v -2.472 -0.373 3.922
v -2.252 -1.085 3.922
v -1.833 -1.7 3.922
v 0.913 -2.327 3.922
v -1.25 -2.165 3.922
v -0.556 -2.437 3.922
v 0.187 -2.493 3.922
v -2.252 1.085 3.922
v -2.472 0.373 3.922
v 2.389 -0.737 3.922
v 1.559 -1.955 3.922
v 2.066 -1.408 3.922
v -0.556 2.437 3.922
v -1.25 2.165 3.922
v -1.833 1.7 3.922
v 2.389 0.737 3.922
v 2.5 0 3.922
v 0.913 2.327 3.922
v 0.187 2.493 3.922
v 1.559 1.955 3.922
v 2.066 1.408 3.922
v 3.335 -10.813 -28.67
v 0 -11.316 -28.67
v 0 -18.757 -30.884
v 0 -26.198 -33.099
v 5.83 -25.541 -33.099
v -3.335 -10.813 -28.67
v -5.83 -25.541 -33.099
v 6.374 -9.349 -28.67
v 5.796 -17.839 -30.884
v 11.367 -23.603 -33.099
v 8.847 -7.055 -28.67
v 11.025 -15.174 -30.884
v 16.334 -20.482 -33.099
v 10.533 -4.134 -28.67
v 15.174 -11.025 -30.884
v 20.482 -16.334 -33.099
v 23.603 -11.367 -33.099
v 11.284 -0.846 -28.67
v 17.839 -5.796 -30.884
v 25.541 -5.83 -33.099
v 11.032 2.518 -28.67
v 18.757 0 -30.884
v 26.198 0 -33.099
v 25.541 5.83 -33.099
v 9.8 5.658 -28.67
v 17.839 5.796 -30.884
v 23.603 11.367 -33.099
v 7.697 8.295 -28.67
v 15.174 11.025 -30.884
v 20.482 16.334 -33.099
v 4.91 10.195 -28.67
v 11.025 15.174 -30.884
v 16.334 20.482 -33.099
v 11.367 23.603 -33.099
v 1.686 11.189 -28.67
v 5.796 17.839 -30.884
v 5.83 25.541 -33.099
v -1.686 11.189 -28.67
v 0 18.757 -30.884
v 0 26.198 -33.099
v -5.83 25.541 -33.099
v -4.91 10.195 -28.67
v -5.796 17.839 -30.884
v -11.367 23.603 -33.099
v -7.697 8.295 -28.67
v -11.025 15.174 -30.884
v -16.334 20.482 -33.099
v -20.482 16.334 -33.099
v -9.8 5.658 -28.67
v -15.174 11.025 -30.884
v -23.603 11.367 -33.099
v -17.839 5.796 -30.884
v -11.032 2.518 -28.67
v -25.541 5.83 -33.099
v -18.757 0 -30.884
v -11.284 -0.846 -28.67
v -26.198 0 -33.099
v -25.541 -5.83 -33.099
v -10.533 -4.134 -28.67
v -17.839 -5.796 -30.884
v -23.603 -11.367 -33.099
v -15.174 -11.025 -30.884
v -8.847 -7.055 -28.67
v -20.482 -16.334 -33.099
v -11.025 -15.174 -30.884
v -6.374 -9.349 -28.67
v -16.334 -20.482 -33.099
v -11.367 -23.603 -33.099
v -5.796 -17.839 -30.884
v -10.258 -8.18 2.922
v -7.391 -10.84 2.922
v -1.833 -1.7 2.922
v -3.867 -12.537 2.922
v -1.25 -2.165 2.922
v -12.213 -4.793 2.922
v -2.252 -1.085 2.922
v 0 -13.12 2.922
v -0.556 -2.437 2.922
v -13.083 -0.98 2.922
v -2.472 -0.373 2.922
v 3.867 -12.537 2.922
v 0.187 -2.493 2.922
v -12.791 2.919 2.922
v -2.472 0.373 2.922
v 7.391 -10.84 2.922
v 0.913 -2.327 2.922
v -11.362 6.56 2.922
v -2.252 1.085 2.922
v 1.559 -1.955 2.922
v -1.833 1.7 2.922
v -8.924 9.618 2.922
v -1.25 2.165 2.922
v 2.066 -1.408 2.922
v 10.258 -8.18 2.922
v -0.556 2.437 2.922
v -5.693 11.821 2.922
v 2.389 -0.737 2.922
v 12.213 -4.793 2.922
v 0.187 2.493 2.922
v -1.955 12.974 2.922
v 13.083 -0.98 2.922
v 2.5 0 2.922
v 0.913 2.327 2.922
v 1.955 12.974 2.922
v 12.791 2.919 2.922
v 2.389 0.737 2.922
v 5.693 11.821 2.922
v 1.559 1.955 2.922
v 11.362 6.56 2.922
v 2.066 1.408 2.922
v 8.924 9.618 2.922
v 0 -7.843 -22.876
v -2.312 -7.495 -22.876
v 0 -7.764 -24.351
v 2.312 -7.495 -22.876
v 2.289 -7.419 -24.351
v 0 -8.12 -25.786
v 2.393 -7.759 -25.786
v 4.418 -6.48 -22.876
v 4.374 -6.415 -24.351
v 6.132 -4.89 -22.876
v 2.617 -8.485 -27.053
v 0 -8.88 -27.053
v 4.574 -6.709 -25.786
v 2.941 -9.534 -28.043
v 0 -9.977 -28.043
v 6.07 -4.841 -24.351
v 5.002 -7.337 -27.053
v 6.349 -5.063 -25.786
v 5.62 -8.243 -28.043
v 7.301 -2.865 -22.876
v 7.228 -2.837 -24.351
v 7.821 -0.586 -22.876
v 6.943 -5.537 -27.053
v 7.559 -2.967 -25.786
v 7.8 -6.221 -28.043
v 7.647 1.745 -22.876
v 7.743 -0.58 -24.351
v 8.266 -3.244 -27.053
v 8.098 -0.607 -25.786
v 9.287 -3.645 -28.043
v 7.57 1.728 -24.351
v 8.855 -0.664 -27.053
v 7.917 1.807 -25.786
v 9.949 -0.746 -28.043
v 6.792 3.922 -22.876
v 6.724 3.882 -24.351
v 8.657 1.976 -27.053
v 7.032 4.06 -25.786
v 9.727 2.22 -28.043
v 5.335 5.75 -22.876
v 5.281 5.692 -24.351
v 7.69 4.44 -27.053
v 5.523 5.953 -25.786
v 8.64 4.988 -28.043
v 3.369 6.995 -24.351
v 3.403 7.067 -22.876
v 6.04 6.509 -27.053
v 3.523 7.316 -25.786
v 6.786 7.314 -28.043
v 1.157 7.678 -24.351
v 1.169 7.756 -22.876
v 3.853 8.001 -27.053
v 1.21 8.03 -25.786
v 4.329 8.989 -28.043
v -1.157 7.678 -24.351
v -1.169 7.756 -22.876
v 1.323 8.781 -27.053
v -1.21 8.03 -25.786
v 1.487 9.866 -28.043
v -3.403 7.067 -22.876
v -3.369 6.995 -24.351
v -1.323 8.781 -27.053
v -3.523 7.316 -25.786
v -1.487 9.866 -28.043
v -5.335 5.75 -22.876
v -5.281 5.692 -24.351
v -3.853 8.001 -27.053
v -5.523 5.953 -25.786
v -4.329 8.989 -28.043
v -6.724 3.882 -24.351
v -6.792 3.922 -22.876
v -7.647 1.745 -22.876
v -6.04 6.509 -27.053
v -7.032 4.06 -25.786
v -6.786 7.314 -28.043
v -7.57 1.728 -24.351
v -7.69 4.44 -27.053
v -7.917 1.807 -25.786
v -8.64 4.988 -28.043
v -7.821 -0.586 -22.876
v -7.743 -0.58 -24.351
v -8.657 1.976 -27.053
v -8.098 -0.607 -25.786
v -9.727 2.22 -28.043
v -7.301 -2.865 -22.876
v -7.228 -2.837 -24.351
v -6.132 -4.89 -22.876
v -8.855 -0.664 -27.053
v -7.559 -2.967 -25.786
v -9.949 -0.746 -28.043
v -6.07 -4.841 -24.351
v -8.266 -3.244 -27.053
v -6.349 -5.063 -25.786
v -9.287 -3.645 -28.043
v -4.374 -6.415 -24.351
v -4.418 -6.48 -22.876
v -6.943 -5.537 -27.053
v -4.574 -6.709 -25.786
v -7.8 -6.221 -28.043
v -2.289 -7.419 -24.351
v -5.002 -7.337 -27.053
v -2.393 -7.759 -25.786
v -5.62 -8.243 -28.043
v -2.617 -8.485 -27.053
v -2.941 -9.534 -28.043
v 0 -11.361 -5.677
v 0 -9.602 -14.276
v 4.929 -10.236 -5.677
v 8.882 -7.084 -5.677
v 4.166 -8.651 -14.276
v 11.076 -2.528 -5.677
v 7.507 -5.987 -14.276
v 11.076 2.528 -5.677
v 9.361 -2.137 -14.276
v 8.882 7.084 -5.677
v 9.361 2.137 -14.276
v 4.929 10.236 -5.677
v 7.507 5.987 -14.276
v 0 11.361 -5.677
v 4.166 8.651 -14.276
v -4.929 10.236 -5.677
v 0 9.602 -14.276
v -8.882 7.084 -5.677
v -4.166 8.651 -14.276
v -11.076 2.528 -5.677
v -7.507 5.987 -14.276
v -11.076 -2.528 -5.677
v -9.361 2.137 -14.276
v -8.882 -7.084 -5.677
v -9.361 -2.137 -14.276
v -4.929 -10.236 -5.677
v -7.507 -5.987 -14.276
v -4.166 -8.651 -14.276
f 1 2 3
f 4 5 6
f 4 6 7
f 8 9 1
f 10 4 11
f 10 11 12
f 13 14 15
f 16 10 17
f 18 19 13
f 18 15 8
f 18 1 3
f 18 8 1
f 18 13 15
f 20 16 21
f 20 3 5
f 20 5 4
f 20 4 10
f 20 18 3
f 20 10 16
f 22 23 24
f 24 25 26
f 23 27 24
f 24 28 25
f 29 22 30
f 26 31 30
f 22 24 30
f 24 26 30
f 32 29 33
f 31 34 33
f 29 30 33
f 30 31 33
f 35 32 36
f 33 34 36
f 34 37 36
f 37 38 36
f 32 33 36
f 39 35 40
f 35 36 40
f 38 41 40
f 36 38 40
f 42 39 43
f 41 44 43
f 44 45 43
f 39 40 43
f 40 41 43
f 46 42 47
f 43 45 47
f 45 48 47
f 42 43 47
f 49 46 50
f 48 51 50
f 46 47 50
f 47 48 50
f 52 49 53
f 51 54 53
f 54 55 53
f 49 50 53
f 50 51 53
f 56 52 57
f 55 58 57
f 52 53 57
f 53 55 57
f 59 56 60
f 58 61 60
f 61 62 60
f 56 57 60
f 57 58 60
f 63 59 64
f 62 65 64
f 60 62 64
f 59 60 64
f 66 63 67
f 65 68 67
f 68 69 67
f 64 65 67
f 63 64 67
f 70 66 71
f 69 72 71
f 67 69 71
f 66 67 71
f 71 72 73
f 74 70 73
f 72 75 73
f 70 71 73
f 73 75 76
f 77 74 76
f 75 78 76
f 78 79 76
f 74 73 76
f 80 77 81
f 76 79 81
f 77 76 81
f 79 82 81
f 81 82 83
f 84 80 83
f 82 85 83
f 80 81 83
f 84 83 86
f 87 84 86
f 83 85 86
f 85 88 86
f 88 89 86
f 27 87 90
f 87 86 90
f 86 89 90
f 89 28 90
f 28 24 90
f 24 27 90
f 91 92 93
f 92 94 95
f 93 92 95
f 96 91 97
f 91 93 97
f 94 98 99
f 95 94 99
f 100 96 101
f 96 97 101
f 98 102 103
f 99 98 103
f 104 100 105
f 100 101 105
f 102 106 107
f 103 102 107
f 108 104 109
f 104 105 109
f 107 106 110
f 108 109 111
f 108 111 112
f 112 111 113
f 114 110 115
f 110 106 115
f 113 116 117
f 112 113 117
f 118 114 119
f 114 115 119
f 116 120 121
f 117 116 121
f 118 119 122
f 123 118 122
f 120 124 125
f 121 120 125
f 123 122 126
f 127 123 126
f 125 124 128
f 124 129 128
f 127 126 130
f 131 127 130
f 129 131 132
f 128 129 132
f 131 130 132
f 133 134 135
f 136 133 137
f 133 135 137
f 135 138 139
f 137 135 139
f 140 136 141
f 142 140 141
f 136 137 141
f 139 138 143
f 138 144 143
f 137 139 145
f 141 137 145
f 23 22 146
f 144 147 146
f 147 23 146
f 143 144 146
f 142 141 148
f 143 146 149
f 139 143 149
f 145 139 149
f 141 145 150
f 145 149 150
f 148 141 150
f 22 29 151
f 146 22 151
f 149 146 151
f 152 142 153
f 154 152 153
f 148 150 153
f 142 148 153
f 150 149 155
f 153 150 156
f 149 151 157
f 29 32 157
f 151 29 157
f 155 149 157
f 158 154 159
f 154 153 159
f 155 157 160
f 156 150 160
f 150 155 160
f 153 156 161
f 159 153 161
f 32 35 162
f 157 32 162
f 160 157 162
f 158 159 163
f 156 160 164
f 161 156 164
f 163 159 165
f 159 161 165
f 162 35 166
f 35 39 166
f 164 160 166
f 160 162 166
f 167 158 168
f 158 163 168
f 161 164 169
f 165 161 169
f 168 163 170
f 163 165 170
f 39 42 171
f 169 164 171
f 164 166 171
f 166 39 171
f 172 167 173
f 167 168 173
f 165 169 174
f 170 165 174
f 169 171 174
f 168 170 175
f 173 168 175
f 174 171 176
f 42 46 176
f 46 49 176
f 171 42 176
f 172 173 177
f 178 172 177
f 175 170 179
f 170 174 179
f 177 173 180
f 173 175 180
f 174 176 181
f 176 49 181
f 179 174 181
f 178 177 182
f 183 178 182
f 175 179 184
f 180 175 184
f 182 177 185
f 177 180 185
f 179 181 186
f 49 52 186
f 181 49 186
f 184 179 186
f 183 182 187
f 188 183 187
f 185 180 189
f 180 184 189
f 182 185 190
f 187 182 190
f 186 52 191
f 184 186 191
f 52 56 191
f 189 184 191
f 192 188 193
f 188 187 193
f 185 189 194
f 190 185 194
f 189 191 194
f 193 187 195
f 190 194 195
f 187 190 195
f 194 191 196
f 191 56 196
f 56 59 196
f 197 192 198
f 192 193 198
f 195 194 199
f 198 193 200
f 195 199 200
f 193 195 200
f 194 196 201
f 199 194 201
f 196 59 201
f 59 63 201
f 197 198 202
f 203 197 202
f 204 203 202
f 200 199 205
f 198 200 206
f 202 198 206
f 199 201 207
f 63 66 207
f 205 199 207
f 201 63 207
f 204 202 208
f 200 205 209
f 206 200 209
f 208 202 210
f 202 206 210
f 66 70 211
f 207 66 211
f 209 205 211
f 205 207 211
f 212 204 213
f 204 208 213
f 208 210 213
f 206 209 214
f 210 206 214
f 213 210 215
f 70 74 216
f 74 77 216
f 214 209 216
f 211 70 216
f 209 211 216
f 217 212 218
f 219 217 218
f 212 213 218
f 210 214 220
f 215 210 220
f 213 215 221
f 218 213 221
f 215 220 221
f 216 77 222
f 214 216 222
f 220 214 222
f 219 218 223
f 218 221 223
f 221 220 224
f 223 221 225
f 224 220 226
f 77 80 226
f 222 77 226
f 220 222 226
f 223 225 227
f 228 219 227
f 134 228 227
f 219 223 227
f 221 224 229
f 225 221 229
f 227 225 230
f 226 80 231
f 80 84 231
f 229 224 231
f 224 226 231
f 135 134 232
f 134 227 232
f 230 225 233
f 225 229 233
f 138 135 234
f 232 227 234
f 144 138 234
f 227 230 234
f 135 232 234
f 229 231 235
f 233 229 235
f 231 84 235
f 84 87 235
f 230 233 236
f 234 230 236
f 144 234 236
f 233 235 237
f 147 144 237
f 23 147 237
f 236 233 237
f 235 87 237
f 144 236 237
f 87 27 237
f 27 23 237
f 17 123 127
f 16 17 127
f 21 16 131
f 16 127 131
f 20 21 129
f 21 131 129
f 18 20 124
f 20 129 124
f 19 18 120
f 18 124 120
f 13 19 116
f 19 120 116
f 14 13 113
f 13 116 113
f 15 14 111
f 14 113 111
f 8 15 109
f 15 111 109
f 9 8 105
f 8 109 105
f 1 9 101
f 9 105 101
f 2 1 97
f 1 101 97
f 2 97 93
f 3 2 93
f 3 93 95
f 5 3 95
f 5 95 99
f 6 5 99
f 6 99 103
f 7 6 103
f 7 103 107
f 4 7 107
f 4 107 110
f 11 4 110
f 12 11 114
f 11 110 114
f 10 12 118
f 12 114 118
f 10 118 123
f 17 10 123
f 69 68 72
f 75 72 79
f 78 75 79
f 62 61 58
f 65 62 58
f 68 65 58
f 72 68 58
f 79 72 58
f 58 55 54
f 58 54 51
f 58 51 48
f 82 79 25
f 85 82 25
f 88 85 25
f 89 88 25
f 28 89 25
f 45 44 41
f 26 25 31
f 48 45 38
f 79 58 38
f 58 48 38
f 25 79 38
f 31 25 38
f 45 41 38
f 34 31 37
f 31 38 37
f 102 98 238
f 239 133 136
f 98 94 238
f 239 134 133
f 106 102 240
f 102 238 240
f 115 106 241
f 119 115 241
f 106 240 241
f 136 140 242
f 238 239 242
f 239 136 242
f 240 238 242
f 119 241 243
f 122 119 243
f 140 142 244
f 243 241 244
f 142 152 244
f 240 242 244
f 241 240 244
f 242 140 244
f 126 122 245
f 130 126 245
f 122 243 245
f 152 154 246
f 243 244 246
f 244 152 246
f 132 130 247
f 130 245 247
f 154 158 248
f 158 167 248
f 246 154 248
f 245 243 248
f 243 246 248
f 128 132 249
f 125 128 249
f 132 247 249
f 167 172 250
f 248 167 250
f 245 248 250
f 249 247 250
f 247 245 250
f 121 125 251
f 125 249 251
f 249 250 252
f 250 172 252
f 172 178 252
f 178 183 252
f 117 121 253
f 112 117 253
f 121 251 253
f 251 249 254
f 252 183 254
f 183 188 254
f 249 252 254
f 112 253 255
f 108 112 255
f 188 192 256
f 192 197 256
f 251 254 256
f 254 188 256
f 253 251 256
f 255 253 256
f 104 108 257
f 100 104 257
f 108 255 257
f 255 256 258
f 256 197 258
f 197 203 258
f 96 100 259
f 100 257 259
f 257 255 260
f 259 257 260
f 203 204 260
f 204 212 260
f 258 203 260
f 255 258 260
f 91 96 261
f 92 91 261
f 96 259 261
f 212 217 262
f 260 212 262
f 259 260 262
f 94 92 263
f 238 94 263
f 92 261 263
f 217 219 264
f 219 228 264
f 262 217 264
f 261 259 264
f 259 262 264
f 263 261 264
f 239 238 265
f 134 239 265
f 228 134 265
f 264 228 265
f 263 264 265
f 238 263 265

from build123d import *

# Parameters (mm, degrees)
F2_R     = 2.5
F3_DEPTH = 1


with BuildPart() as f1:
    # F0 (on Right) → F1 (revolve)
    with BuildSketch(Plane.YZ):
        with BuildLine():
            Line((0, 2.922098), (-13.120043, 2.922098))
            Line((-13.120043, 2.922098), (-7.84326, -22.875503))
            ThreePointArc((-7.84326, -22.875503), (-8.452987, -26.447656), (-11.315567, -28.669745))
            Line((-11.315567, -28.669745), (-26.197754, -33.098966))
            Line((-26.197754, -33.098966), (0, -33.098966))
            Line((0, -33.098966), (0, 2.922098))
        make_face()
    revolve(axis=Axis((0, 0, -15.088434), (0, 0, 1)))

    # F2 (on face) → F3 (join)
    with BuildSketch(Plane.XY.offset(2.922098)):
        Circle(F2_R)
    extrude(amount=F3_DEPTH)


solid = f1.part
